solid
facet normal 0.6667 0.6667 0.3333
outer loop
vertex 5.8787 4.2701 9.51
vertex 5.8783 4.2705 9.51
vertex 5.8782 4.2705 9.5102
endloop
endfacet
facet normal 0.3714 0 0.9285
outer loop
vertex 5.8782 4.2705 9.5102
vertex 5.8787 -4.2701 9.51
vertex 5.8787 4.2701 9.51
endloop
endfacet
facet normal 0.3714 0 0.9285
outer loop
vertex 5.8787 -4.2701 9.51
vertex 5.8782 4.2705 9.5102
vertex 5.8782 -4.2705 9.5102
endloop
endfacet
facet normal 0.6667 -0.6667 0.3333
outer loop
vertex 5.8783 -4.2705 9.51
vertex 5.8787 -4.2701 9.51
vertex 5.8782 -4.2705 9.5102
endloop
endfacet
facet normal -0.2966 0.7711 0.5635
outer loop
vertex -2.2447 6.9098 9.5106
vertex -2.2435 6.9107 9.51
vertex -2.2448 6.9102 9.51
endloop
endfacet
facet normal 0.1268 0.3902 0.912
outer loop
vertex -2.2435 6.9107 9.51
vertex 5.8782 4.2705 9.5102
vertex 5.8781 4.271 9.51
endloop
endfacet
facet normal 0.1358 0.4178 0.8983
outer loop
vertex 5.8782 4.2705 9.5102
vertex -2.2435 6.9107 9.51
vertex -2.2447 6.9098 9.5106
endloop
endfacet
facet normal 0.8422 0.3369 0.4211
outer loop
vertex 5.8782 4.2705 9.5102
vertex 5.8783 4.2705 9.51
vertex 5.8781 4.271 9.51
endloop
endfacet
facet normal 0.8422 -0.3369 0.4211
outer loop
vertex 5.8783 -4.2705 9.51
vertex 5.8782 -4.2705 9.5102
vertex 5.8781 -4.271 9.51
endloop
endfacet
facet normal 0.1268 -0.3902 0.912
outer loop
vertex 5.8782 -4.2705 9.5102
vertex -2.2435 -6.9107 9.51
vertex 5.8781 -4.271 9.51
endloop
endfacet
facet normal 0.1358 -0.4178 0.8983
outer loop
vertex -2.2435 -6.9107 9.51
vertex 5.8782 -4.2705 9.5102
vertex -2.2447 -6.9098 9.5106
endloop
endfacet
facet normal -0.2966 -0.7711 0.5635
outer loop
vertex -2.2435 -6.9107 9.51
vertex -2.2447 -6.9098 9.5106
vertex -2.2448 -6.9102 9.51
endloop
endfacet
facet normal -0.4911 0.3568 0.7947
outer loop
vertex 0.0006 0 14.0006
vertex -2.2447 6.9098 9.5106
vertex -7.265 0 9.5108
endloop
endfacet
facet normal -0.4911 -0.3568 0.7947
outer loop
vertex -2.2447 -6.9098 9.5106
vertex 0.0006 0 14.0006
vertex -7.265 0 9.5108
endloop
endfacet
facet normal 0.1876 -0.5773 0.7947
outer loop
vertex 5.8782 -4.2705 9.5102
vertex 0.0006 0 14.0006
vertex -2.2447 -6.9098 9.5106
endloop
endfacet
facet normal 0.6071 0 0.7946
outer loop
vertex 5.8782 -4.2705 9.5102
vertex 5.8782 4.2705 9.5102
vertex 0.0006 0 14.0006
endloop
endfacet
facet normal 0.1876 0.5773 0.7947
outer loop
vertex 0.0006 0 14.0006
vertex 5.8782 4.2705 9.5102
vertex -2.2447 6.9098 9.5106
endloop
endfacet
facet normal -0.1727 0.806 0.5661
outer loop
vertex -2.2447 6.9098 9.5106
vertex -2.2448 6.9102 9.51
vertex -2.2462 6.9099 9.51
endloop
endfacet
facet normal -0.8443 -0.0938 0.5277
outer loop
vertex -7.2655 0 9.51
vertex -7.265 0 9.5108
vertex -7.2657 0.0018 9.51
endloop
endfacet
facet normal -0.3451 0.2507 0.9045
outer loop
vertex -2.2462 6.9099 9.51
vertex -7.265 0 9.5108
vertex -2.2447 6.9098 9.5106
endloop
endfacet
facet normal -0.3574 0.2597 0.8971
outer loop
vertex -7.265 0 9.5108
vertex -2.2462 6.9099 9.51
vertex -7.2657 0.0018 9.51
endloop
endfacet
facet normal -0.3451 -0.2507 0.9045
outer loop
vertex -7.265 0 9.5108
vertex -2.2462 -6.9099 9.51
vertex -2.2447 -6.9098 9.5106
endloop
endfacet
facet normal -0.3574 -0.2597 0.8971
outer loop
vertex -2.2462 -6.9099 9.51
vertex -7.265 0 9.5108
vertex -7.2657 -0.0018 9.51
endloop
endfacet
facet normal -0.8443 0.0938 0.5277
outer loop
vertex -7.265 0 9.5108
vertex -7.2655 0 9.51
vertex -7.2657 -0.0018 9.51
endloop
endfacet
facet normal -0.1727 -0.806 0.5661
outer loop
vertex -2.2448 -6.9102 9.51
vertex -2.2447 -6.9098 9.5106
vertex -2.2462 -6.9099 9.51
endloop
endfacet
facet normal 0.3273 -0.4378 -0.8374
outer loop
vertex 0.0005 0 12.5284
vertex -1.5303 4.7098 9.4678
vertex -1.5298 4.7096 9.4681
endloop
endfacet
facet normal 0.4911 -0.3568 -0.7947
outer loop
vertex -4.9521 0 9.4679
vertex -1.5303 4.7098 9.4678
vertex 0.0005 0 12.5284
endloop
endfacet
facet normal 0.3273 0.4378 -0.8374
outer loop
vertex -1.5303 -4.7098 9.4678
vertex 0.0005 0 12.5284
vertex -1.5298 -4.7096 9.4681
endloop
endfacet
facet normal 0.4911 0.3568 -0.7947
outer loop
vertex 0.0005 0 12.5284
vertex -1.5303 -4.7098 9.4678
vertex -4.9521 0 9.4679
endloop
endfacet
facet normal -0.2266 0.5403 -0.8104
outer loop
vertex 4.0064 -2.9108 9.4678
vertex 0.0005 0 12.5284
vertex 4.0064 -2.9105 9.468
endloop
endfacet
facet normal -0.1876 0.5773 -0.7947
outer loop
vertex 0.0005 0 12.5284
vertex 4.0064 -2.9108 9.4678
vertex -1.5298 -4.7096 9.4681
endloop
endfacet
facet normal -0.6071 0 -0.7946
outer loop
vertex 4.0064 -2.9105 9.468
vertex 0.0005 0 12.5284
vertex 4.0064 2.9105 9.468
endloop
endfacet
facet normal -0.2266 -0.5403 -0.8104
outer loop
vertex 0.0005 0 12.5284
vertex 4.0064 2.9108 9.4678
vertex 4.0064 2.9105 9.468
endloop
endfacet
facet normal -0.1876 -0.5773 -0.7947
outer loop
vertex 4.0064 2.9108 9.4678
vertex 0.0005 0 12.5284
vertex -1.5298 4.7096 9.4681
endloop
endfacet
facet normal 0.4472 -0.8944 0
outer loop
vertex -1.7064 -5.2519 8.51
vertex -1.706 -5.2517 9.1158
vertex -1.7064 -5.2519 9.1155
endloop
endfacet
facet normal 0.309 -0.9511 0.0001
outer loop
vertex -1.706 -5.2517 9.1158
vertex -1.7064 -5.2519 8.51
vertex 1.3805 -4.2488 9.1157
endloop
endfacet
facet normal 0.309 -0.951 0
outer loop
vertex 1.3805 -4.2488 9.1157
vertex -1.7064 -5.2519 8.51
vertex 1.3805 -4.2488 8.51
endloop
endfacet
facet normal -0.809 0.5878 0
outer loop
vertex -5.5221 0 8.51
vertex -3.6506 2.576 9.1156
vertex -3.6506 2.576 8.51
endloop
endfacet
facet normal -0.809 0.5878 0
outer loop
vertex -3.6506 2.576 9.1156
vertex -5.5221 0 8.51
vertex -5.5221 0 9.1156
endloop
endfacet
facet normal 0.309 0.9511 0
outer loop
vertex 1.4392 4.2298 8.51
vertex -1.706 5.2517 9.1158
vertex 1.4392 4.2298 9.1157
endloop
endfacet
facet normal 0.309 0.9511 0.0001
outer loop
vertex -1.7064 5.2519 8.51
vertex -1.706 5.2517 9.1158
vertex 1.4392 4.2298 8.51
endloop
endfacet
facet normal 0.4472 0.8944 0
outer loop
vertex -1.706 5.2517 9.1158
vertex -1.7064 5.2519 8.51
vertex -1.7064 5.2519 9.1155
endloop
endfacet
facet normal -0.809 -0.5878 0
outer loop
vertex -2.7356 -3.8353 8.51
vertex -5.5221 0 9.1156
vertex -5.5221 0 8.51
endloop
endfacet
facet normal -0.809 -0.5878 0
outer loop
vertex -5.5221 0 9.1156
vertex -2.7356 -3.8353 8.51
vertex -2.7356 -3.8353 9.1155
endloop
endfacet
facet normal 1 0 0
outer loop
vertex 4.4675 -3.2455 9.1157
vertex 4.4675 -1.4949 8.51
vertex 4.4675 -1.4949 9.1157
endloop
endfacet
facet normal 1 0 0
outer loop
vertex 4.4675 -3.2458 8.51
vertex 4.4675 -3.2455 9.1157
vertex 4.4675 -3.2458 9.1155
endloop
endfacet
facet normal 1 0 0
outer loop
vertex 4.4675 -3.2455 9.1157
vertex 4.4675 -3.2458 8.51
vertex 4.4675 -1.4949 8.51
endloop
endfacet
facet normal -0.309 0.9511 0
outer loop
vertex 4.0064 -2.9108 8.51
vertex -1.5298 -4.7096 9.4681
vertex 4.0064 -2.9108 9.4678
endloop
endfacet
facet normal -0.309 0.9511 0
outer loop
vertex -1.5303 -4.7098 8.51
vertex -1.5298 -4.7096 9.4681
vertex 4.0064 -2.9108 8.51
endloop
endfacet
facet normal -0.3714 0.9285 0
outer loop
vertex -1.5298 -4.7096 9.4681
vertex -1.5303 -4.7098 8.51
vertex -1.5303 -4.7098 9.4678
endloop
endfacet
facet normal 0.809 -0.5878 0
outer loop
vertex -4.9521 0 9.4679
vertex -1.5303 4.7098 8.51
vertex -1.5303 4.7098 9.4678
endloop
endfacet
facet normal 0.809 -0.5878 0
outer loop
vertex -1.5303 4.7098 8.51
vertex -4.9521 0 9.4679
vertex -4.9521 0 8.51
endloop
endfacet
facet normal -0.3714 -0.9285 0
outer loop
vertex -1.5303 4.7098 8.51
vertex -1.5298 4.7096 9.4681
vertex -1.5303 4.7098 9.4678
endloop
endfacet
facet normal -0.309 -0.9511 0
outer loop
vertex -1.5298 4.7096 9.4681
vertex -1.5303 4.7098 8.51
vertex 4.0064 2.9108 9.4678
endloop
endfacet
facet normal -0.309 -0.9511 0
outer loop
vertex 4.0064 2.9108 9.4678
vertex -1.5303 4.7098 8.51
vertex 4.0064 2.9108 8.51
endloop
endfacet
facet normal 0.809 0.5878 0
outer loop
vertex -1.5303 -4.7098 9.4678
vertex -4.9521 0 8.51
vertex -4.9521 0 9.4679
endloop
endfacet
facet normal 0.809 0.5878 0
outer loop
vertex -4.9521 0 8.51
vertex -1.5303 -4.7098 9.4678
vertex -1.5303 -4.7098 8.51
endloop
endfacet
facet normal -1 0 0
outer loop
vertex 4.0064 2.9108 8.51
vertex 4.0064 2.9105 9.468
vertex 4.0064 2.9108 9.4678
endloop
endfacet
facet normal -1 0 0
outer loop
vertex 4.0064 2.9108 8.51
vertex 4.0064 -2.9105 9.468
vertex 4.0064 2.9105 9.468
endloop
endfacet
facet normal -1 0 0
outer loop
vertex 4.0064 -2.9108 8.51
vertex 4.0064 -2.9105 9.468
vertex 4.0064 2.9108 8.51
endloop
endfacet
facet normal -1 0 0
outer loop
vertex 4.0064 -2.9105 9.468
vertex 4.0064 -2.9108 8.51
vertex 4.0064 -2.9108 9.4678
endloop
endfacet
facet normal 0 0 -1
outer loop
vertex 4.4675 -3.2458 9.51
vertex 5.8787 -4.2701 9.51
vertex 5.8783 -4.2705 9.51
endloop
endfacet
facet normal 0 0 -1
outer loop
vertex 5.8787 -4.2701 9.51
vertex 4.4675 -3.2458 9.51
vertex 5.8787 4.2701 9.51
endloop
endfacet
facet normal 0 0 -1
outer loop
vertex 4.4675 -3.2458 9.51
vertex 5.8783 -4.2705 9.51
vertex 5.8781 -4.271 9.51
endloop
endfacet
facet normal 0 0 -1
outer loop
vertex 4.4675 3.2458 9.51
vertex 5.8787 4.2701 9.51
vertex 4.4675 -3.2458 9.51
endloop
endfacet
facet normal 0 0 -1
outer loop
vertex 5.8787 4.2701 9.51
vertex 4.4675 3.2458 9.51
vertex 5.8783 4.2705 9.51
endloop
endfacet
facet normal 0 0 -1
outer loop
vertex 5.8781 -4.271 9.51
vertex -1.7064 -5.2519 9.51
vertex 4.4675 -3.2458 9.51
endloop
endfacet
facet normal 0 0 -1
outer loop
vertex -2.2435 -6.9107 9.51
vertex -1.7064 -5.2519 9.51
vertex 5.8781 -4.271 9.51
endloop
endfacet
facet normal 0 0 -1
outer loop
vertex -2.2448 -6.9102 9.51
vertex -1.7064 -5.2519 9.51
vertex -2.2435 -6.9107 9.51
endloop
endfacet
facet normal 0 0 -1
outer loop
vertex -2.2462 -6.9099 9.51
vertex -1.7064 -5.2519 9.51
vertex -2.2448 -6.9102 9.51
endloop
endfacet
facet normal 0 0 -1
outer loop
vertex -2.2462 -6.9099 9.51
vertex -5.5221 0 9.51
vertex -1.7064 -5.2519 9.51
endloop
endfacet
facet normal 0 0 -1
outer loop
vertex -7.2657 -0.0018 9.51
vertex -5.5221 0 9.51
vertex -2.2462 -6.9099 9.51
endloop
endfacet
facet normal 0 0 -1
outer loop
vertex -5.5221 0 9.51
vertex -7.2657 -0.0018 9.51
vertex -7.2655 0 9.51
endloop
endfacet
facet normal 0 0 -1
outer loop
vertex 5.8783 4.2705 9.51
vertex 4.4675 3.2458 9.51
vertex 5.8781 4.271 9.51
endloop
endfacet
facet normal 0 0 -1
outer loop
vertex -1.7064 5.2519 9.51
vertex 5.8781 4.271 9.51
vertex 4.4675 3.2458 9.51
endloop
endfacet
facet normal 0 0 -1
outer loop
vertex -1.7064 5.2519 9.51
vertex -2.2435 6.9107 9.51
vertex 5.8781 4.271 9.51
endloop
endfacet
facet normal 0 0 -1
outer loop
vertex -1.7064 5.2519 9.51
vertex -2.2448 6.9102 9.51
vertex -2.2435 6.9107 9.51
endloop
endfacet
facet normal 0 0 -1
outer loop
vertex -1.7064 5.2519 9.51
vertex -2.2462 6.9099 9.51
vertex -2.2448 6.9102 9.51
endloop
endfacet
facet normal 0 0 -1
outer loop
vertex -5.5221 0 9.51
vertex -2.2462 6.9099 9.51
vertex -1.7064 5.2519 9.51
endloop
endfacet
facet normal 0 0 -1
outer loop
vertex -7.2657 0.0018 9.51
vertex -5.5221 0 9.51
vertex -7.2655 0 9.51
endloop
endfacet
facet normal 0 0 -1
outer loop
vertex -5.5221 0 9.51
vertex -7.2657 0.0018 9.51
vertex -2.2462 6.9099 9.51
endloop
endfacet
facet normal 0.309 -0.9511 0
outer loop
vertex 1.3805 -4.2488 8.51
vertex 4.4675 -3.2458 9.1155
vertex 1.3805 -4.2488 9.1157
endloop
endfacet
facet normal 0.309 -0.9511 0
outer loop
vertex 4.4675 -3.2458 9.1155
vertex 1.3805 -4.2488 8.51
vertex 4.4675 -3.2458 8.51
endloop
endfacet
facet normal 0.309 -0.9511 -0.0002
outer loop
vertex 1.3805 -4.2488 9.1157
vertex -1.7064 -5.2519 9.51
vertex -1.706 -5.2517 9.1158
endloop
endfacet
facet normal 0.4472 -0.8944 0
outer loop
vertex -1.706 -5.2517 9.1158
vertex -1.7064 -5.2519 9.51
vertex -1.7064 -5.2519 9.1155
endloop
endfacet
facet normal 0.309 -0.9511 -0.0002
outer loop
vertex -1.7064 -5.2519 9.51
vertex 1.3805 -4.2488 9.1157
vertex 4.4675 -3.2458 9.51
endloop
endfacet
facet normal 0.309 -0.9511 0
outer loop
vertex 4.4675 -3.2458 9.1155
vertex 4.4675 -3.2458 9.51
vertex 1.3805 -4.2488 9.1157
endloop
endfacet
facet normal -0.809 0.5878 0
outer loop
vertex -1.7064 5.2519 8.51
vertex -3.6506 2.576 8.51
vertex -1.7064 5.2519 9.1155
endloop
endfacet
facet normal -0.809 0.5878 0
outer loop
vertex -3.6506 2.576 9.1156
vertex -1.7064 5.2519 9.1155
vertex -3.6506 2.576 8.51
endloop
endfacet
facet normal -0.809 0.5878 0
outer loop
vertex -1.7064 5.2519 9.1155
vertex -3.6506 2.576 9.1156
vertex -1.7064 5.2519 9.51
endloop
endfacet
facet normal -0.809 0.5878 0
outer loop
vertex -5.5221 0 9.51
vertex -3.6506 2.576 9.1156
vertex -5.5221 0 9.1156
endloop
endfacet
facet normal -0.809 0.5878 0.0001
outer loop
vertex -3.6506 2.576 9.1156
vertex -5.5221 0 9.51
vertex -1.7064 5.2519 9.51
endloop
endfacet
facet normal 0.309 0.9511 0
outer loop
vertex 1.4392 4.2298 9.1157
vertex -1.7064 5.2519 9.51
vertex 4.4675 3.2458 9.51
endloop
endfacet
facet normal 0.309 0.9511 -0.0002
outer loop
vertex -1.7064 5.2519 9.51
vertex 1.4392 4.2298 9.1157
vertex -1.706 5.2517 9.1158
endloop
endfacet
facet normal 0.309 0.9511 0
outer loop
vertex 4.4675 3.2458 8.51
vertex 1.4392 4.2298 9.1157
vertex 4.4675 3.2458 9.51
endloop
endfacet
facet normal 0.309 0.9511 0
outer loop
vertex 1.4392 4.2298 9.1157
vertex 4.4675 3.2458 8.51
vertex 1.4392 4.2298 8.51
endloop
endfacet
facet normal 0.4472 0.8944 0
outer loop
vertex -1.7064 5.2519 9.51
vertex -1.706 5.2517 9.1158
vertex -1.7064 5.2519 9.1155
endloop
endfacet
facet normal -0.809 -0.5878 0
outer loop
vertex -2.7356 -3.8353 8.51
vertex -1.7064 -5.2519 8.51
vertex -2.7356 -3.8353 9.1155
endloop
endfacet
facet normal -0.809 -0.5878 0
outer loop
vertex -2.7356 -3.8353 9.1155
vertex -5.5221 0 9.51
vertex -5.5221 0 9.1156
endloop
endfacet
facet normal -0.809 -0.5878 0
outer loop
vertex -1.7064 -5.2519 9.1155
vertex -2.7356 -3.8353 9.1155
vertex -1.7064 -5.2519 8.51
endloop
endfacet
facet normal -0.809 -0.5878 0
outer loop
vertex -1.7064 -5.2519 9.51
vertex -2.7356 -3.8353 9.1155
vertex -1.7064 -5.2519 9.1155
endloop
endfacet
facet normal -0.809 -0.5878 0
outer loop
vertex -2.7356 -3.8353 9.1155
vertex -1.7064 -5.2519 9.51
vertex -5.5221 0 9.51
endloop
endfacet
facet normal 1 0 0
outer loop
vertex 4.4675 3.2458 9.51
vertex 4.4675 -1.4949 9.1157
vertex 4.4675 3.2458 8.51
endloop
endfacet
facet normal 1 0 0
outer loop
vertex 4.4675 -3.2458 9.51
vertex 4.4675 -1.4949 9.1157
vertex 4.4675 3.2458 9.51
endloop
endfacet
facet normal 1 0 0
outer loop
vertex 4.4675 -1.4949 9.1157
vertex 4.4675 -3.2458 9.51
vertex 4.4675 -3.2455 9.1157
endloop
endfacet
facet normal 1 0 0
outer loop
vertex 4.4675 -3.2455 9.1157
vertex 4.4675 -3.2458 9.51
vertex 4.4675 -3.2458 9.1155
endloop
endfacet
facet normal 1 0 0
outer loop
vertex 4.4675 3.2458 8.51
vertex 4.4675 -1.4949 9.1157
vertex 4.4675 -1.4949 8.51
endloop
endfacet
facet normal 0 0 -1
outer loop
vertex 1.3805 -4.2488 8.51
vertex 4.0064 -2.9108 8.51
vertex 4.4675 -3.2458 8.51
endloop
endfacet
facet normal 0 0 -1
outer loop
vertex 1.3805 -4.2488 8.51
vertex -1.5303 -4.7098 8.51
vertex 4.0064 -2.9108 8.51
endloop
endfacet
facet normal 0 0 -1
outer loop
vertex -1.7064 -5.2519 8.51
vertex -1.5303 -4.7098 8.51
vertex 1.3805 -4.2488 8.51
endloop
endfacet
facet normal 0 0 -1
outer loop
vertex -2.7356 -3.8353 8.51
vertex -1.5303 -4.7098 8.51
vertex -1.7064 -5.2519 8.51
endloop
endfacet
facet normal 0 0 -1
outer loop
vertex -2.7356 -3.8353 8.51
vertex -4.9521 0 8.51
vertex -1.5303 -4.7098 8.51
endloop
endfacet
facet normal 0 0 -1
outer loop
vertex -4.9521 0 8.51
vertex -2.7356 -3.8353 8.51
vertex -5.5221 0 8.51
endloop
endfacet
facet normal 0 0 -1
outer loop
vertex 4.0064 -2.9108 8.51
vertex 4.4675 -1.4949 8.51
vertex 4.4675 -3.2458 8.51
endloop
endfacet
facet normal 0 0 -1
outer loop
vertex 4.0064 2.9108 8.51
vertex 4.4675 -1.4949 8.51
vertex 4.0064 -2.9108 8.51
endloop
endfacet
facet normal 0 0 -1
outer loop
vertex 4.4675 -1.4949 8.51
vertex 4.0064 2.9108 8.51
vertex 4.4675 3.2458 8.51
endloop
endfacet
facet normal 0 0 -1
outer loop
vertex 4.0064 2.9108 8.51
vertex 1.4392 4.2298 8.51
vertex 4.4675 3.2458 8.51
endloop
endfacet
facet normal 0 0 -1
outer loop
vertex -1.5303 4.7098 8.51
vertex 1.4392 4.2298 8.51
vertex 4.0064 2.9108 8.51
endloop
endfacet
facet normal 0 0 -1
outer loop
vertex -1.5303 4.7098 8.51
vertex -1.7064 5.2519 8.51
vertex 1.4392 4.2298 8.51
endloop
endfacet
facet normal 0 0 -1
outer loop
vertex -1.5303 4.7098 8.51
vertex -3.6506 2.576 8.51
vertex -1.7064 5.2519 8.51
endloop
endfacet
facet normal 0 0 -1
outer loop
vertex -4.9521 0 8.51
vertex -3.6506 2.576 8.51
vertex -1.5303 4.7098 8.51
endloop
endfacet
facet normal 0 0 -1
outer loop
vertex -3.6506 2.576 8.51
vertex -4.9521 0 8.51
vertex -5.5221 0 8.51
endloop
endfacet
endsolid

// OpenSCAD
include <Dodécaèdre Christique pendentif sphère 33mm.scad>;

//arete = 21.409;
diameter = 28;
creux = 1; // creux ou plein || 1 ou 0
paroi = 1;
bouchon = 1; // 1 ou 0
corps = 0; // 1 ou 0
rotate_body = 0;
bottom_hole = 1; // 1 ou 0
bottom_hole_diameter = 1.5;
bouchonOffset = 0.6;
r = 0.19; // résolution d'impression sur l'axe Z

// Controle rotation viewport quand animation en route
//$vpr = [70, 0, $t * 180];

/* Forme
Choix parmi:
- 0 => Etoilé
- 1 => Christique
- 2 => Christique_inversé
- 3 => Pentakis // (all points on sphere)
- 4 => Animate // voir plus bas pour plus d'infos
*/
forme_ID = 1;

/////////
